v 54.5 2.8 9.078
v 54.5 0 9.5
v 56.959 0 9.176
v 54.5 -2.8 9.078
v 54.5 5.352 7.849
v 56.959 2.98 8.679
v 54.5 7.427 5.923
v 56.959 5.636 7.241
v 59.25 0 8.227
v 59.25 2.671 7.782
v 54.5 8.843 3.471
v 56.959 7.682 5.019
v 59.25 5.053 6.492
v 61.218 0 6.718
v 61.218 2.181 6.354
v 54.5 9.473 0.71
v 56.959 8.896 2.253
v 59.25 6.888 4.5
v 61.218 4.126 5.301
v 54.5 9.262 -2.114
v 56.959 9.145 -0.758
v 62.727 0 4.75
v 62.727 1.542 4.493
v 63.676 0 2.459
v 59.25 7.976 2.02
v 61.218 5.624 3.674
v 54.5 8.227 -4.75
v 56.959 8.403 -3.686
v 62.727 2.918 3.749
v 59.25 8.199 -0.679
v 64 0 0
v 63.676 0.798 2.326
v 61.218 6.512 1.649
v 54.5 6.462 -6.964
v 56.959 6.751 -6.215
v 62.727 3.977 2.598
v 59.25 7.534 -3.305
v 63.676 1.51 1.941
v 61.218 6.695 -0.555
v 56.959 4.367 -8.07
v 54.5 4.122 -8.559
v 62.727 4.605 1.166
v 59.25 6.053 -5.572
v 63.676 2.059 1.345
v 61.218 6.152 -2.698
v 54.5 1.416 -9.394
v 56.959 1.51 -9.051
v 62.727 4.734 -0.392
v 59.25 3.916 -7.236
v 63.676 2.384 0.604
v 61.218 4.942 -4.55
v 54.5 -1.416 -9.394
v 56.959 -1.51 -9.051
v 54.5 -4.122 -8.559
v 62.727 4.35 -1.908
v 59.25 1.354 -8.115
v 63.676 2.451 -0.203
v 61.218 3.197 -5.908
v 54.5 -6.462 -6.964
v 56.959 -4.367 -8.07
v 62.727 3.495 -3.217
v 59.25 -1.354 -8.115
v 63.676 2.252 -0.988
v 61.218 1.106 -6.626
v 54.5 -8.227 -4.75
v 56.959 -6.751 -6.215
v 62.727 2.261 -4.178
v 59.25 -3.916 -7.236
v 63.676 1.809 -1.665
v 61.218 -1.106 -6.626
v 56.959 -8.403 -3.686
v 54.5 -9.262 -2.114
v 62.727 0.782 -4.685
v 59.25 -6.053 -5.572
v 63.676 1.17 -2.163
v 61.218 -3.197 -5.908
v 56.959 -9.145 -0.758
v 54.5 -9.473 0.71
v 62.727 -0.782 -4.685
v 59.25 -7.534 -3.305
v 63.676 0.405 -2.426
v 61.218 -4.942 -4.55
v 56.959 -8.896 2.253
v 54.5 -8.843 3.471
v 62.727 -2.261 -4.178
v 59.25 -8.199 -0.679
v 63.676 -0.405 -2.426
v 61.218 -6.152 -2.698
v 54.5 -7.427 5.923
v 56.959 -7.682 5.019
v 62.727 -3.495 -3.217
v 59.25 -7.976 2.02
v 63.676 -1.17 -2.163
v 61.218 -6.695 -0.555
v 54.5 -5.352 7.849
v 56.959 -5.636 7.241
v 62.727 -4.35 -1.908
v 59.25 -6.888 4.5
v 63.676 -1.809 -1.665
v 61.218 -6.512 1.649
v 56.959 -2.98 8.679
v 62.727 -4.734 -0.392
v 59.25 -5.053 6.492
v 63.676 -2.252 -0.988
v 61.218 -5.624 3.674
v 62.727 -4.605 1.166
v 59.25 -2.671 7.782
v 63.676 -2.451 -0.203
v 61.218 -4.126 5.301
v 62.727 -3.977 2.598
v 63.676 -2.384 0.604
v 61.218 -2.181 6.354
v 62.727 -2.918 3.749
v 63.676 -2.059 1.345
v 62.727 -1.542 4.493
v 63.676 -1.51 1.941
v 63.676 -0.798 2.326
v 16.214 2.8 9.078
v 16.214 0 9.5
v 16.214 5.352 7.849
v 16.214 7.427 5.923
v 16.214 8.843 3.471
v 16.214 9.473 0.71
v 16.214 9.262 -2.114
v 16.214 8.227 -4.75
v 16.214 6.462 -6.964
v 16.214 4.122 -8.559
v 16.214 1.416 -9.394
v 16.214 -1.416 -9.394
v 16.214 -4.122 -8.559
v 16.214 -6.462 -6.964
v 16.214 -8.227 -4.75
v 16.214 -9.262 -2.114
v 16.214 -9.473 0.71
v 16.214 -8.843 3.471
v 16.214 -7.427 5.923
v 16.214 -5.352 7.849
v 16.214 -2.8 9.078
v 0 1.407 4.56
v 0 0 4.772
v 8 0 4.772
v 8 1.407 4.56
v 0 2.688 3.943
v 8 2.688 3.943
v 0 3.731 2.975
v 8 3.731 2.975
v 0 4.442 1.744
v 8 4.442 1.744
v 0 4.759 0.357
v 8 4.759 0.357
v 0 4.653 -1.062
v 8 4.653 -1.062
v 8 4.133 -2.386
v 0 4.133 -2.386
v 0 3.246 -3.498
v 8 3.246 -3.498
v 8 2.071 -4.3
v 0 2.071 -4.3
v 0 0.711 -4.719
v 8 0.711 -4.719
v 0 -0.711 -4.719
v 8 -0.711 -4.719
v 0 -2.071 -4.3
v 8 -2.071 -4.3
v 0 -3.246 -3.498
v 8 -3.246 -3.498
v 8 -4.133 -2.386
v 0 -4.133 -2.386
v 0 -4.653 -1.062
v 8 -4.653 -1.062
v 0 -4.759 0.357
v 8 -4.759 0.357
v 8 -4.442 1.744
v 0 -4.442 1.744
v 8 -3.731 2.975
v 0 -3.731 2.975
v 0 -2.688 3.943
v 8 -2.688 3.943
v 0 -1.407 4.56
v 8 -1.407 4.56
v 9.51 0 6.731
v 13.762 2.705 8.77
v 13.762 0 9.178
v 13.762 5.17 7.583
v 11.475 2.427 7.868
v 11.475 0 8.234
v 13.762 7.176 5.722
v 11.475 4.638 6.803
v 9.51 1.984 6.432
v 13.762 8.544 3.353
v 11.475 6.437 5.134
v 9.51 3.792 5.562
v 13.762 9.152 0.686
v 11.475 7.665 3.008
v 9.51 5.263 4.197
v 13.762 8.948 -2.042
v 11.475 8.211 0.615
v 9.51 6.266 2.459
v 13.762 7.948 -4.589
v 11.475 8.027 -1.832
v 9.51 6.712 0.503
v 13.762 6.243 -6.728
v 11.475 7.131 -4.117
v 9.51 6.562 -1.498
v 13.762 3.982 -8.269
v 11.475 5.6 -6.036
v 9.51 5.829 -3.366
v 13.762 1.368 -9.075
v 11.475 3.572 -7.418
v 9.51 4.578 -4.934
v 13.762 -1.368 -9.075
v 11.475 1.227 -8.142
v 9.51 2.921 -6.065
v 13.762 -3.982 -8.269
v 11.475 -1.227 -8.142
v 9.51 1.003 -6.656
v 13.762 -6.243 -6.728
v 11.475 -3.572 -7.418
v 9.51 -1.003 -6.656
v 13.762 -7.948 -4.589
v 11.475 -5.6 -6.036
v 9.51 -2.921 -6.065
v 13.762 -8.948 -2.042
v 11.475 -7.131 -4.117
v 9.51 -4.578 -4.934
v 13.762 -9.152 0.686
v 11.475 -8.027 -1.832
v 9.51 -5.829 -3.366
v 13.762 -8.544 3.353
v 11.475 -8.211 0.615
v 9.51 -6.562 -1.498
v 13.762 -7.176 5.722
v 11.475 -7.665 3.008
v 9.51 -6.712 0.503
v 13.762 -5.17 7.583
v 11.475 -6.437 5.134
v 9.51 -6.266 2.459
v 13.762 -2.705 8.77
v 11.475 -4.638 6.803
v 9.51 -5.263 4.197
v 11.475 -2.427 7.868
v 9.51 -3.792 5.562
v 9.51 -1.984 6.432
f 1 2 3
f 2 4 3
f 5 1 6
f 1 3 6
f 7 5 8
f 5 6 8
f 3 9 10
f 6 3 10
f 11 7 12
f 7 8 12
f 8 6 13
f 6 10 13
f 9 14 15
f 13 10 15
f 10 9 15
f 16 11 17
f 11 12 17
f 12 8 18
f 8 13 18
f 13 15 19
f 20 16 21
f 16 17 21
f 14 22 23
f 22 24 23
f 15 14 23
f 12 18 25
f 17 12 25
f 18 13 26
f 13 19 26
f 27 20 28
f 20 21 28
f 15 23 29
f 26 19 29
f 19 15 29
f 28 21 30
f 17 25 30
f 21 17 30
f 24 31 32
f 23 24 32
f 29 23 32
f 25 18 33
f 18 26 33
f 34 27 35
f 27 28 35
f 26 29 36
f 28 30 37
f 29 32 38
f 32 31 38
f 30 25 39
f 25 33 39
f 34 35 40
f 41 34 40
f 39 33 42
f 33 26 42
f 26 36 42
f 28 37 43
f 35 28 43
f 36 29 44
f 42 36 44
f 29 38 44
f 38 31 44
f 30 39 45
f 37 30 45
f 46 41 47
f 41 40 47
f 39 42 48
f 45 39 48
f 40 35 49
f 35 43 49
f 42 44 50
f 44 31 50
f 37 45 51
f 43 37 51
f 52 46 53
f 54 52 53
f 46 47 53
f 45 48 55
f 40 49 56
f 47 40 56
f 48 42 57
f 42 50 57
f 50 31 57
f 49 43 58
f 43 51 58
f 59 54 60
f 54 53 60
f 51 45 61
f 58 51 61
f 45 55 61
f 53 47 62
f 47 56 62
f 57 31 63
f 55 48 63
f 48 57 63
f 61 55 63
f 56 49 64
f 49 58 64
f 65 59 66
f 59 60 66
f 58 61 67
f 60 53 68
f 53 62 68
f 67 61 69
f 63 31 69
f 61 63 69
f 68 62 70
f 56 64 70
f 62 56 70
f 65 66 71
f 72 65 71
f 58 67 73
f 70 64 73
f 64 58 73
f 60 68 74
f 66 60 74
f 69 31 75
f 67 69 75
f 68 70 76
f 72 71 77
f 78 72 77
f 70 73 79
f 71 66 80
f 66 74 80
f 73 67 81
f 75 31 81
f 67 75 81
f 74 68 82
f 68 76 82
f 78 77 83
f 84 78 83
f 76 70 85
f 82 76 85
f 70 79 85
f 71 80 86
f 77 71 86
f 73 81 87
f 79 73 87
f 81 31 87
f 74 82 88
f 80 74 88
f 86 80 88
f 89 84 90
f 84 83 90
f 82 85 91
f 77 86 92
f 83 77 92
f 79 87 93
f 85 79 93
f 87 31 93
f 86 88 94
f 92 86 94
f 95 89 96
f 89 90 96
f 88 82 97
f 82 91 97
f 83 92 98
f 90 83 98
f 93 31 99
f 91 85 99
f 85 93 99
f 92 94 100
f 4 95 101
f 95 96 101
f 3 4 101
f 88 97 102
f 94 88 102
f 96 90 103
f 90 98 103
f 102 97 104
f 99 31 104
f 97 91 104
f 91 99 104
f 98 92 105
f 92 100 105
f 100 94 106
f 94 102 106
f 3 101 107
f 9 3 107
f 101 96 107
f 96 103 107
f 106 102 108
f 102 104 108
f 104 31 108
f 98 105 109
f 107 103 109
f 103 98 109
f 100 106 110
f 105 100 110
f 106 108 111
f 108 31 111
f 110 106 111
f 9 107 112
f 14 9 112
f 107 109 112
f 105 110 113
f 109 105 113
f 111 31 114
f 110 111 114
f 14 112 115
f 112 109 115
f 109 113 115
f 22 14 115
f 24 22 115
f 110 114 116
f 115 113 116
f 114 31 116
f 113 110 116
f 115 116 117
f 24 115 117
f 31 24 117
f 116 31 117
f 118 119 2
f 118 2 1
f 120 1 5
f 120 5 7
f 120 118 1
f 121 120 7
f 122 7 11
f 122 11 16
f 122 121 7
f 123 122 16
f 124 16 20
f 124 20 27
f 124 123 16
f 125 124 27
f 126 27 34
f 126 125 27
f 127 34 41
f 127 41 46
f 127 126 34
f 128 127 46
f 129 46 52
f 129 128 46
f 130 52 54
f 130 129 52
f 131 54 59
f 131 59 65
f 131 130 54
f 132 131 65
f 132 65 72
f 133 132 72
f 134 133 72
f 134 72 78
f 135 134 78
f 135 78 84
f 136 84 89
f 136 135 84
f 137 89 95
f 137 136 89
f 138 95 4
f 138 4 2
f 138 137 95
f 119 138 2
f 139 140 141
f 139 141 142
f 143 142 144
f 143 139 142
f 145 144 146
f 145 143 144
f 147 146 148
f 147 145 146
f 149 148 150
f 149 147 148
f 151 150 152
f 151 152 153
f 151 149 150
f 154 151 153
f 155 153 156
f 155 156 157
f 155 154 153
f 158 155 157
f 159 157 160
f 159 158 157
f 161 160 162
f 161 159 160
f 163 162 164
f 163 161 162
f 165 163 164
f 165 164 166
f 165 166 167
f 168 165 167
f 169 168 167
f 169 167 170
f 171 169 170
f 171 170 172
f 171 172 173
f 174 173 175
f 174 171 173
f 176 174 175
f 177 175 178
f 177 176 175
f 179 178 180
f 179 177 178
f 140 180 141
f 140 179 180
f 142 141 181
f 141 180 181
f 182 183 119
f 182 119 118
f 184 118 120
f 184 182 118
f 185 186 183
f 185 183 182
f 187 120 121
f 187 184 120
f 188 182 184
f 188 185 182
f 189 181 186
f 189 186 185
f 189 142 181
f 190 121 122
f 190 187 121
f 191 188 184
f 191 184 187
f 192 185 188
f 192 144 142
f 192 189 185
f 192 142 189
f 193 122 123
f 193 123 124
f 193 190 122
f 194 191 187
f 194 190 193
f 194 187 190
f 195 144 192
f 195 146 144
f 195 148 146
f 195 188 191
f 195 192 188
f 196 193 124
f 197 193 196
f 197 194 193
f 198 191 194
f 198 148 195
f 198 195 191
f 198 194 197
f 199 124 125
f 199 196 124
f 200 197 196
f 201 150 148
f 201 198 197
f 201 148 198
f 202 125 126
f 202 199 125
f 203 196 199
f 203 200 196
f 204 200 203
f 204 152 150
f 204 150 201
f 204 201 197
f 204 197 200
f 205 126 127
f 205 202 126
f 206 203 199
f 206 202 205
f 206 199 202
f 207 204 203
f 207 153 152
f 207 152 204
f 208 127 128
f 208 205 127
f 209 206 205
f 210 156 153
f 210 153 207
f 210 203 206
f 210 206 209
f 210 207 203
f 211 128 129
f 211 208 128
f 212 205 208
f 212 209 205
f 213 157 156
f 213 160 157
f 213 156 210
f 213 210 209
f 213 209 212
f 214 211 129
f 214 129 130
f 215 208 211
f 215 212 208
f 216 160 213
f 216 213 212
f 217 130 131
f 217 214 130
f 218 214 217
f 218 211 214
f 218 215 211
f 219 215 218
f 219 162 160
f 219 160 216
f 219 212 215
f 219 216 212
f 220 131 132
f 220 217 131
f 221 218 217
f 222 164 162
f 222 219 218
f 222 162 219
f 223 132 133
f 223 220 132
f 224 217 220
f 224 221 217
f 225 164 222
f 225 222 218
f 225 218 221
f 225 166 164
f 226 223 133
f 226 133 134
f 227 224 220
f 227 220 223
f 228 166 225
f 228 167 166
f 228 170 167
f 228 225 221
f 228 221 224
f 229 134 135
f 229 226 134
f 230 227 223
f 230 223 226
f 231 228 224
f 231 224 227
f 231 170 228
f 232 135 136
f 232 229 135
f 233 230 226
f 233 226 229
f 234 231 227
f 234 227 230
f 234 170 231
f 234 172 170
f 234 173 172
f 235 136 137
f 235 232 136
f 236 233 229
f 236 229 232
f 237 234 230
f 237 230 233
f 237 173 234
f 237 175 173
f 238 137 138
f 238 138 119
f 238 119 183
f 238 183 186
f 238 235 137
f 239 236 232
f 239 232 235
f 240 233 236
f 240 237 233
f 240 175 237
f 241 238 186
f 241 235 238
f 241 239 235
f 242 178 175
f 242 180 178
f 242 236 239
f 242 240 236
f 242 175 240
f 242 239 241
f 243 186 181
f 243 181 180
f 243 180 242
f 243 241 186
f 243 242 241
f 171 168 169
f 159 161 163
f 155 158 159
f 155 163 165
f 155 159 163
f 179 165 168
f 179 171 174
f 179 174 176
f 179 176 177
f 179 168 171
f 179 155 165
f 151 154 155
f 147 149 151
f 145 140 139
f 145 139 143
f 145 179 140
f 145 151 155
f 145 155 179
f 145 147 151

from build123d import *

# Parameters (mm, degrees)
F3_R = 9.4996


# Not quite as in the source:
# - a fillet or chamfer that OpenCascade refuses, or shapes differently, is made with other operations: its cross-section is extruded or revolved along the edge and cut away or added


with BuildPart() as f1:
    # F0 (on Front) → F1 (revolve)
    with BuildSketch(Plane.XZ):
        Polygon((0, 4.7723002699), (0, 0), (64, 0), (64, 9.5), (8, 9.5), (8, 4.7723002699), align=None)
    revolve(axis=Axis((32, 0, 0), (-1, 0, 0)))

    # F2: fillet of radius 9.4996 on 1 edges, made by hand

    # F2_s1 → F2_t2 (revolve, cut)
    with BuildSketch(Plane.XZ):
        with BuildLine():
            ThreePointArc((16.2140956882, 9.5), (11.4753587068, 8.2336722524), (8, 4.7723002699))
            Line((8, 4.7723002699), (8, 9.5))
            Line((8, 9.5), (16.2140956882, 9.5))
        make_face()
    revolve(axis=Axis((8, 0, 0), (-1, 0, 0)), mode=Mode.SUBTRACT)

    # F3
    f3_edges = [f1.edges().sort_by_distance(p)[0] for p in [
        (64, 0, -9.5),
    ]]
    fillet(f3_edges, radius=F3_R)


solid = f1.part
